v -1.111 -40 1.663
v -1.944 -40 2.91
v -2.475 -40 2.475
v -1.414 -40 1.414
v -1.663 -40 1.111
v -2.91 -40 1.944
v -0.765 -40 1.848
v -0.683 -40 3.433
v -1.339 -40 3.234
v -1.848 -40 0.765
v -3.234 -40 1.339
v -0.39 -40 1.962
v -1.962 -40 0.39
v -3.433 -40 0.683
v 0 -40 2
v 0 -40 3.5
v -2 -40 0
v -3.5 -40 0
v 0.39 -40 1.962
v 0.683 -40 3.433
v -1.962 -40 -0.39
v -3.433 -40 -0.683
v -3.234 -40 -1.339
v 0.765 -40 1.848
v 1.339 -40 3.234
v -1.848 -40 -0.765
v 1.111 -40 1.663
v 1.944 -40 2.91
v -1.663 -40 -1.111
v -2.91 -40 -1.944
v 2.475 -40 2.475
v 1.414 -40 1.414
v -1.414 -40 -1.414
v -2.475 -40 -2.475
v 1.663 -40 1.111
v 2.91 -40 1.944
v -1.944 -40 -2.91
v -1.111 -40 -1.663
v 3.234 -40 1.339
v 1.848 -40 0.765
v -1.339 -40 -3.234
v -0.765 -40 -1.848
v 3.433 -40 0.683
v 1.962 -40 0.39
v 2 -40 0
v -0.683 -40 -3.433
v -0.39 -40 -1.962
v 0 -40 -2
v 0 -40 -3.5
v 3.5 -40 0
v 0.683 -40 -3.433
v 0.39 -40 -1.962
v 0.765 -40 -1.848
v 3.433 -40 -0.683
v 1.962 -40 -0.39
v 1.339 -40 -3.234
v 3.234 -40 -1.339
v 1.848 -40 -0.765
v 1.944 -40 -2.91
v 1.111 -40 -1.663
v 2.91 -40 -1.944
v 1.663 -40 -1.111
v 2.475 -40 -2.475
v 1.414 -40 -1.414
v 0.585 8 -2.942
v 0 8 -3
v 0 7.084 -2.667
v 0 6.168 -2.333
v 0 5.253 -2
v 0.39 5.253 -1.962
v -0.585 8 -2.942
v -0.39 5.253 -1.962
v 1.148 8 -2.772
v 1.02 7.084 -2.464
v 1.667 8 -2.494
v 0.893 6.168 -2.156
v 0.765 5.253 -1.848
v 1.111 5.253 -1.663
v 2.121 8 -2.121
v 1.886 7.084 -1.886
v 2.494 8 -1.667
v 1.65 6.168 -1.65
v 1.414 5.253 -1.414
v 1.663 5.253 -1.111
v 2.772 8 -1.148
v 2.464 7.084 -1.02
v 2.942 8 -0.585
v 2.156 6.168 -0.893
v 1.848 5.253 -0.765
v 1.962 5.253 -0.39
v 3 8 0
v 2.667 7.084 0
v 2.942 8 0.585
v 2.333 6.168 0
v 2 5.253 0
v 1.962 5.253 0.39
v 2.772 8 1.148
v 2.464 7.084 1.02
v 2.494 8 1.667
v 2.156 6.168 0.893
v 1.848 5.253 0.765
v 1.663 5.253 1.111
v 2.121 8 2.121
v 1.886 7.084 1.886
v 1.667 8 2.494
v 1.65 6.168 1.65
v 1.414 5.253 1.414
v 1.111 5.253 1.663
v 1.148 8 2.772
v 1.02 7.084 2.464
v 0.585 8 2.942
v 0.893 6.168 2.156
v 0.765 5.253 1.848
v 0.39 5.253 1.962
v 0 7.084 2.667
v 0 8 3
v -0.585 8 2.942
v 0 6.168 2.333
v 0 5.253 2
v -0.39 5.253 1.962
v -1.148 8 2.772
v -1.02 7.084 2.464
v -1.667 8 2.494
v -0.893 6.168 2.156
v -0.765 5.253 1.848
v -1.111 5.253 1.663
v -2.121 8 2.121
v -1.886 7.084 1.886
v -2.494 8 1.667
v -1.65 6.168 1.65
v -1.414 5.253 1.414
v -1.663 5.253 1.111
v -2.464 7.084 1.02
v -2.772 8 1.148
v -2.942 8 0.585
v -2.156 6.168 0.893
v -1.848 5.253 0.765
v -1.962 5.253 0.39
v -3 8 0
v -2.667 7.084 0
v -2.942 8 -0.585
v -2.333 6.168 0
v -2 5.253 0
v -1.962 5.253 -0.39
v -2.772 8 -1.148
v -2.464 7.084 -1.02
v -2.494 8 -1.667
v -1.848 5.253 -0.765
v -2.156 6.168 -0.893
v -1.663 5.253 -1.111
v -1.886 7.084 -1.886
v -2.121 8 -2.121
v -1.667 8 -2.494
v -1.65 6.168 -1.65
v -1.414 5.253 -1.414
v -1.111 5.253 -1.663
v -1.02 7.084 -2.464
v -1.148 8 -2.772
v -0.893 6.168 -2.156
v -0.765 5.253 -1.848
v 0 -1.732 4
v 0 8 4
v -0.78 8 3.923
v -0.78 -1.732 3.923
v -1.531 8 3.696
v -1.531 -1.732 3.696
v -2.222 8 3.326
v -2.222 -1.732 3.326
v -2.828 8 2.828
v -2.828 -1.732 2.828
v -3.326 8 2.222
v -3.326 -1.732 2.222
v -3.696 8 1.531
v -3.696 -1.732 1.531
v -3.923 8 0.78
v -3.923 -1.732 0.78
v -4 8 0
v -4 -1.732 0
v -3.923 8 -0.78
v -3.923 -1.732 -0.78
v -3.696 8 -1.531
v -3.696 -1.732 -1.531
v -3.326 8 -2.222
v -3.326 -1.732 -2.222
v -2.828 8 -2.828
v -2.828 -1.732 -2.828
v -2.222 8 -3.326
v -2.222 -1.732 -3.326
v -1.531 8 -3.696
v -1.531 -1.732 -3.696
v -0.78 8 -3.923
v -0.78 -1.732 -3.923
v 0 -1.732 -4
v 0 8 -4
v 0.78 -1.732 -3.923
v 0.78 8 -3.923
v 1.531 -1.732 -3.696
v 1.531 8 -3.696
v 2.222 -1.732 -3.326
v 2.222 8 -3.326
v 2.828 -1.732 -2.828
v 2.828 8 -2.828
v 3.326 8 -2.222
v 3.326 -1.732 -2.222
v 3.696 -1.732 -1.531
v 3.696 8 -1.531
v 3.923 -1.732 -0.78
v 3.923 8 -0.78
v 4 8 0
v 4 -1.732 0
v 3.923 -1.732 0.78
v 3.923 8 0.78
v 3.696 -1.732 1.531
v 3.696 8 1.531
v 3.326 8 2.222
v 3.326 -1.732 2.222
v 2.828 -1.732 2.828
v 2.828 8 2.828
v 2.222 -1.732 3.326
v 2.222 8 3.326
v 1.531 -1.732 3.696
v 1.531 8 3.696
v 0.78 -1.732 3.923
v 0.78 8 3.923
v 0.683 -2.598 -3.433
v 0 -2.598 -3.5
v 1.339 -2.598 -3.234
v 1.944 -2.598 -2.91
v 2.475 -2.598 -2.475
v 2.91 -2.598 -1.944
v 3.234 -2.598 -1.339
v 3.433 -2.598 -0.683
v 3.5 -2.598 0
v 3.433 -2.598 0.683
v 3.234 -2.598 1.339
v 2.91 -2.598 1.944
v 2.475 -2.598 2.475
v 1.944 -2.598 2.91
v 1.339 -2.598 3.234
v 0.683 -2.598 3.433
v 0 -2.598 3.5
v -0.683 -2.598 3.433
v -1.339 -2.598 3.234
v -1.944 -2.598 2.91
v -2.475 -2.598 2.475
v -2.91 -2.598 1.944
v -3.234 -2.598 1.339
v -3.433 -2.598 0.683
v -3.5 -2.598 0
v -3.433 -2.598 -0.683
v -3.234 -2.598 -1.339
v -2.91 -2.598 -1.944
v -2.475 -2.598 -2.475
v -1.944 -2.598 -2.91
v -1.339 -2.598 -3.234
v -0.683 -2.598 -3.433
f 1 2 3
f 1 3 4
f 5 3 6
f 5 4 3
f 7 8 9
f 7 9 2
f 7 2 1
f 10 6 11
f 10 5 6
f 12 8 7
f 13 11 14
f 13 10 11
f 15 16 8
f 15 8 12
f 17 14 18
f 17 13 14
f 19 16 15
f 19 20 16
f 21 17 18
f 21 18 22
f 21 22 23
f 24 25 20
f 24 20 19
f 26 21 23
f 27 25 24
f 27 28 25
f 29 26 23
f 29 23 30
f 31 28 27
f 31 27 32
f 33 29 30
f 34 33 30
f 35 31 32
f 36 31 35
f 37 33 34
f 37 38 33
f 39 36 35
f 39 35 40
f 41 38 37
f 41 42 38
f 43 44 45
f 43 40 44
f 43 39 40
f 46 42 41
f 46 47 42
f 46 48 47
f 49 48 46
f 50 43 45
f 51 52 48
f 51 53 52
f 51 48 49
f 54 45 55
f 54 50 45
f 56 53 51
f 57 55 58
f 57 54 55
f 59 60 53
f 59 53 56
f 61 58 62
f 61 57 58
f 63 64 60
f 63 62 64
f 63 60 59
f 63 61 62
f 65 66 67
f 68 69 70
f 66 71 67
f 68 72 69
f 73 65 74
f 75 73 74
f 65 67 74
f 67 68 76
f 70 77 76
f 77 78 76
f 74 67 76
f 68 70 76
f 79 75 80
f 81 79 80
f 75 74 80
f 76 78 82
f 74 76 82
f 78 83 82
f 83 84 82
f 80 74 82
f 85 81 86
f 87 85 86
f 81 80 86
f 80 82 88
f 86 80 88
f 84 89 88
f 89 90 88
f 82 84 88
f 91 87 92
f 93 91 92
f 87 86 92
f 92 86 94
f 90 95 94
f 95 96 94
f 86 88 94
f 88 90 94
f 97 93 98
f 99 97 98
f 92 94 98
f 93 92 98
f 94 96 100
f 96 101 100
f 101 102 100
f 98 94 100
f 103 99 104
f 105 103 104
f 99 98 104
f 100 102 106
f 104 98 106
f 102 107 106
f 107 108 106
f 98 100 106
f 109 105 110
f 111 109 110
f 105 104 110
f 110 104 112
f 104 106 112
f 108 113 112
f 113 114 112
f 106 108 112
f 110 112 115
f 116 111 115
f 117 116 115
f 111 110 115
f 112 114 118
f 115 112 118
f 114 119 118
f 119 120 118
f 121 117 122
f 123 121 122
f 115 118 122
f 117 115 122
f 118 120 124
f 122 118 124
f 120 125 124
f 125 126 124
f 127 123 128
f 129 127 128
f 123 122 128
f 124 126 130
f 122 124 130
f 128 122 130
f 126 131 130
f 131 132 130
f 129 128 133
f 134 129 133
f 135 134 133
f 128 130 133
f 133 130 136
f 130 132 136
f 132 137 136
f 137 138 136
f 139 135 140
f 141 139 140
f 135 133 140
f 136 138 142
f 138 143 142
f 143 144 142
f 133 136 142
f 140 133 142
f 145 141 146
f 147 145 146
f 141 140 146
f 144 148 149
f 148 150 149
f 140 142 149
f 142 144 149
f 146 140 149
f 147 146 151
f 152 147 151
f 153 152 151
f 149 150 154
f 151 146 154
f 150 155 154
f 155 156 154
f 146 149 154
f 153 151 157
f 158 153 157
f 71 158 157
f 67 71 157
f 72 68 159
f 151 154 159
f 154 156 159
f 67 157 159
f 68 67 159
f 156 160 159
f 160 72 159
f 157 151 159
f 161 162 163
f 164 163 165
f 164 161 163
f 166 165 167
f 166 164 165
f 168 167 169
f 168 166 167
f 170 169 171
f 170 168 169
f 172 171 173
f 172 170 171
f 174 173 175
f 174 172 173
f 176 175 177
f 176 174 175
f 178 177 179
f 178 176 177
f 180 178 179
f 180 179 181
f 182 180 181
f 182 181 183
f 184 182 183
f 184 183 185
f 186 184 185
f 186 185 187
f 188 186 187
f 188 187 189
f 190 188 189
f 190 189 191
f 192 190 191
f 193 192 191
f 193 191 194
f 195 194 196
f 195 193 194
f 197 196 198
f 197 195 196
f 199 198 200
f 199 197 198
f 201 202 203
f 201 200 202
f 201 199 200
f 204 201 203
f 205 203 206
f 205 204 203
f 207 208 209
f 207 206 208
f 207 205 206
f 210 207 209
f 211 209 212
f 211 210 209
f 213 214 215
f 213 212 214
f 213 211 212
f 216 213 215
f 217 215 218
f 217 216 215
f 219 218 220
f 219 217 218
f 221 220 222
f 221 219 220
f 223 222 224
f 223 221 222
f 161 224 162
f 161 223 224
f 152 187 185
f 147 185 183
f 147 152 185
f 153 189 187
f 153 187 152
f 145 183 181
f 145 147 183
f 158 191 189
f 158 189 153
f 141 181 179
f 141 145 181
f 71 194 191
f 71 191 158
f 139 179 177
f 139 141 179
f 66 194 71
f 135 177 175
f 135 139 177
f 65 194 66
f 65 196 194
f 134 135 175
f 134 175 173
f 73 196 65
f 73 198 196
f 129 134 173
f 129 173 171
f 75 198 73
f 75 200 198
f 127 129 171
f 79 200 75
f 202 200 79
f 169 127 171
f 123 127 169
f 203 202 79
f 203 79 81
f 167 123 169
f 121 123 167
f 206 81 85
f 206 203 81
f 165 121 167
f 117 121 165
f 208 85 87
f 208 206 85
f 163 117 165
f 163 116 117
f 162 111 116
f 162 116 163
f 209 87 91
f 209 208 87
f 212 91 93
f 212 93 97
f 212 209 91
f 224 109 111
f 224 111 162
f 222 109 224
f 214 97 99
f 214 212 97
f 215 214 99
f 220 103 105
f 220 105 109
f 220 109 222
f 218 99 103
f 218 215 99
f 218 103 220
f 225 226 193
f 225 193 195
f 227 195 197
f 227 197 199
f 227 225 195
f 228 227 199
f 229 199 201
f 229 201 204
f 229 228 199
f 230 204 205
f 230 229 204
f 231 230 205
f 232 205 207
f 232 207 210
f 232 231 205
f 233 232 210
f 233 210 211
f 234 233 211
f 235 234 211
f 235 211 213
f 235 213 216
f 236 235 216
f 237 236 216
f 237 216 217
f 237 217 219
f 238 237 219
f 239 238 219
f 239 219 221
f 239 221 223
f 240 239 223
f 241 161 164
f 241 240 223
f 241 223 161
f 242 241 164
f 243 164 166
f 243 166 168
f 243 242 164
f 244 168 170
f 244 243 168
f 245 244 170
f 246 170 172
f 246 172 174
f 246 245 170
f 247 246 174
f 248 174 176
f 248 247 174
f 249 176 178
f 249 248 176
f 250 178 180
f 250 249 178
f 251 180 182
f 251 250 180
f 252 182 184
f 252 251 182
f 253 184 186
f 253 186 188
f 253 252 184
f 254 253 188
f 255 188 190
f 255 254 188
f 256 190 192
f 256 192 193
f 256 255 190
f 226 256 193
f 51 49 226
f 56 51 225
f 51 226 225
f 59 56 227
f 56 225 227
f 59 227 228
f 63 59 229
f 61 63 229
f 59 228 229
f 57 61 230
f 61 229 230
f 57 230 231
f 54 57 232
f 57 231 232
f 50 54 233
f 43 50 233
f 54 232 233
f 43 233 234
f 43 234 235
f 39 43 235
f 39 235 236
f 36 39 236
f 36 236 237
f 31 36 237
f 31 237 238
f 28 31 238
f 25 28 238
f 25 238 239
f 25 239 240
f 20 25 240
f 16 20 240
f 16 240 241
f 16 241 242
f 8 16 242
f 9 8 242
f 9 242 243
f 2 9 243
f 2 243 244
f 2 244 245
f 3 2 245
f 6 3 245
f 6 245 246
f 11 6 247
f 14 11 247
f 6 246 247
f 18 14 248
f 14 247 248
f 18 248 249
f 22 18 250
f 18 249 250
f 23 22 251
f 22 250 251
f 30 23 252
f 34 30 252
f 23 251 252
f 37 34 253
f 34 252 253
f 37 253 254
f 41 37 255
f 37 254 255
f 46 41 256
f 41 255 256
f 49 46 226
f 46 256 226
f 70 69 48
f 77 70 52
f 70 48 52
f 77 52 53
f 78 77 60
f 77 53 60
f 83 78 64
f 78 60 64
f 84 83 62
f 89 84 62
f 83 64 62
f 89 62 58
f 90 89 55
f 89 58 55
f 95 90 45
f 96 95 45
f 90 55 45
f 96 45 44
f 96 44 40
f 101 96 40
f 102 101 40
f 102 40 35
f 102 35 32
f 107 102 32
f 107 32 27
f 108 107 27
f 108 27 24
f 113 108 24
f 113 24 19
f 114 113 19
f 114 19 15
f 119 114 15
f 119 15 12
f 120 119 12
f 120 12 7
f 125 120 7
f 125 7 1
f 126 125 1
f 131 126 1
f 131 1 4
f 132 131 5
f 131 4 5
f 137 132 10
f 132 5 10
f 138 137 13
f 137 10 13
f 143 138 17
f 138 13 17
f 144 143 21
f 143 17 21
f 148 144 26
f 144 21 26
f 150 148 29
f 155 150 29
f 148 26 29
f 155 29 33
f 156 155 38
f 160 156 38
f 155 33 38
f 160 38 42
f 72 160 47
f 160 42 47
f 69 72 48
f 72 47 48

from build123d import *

# Parameters (mm, degrees)
SKETCH_1_R          = 4
EXTRUDE_1_DEPTH     = 8
SKETCH_2_R          = 3.5
EXTRUDE_2_DEPTH     = 40
CHAMFER_1_SIZE      = 1.5
CHAMFER_1_SIZE_2    = 2.598076211
SKETCH_3_R          = 2
CUT_EXTRUDE_1_DEPTH = 101
CHAMFER_2_SIZE      = 1
CHAMFER_2_SIZE2     = 2.747477419


with BuildPart() as part:
    # 草图1 → 凸台-拉伸1 (new body)
    with BuildSketch(Plane(origin=(0, 0, 0), x_dir=(1, 0, 0), z_dir=(0, 1, 0))):
        with Locations(Location((0, 0, 0), (0, 0, 270))):
            Circle(SKETCH_1_R)
    extrude(amount=EXTRUDE_1_DEPTH)

    # 草图2 → 凸台-拉伸2 (add)
    with BuildSketch(Plane.XZ):
        with Locations(Location((0, 0, 0), (0, 0, 270))):
            Circle(SKETCH_2_R)
    extrude(amount=EXTRUDE_2_DEPTH)

    # 倒角1
    # the kernel refuses this chamfer: 2.598076211, 1.5 mm, written as the material it adds along each edge
    with BuildSketch(Plane(origin=(0, 0, 0), x_dir=(0, 0, -1), z_dir=(-1, 0, 0))) as chamfer_1_piece_1_section:
        Polygon((3.5 + CHAMFER_1_SIZE, 0), (3.5, CHAMFER_1_SIZE_2), (3.5, 0), align=None)
    chamfer_1_piece_1 = revolve(axis=Axis((0, 0, 0), (0, -1, 0)), mode=Mode.PRIVATE)
    chamfer_1_piece_1 = chamfer_1_piece_1 & Plane(origin=(0, -2.194625368, 0), x_dir=(0, 0, 1), z_dir=(0, -1, 0)) * Cylinder(4, 20, mode=Mode.PRIVATE)
    add(chamfer_1_piece_1)

    # 草图3 → 切除-拉伸1 (cut)
    with BuildSketch(Plane.XZ.offset(40)):
        with Locations(Location((0, 0, 0), (0, 0, 270))):
            Circle(SKETCH_3_R)
    extrude(amount=-CUT_EXTRUDE_1_DEPTH, mode=Mode.SUBTRACT)

    # 倒角2
    chamfer_2_edges = [part.edges().sort_by_distance(p)[0] for p in [
        (0, 8, 2),
    ]]
    chamfer_2_side = [part.faces().sort_by_distance(p)[0] for p in [
        (0, 8, -3.886862915),
    ]]
    chamfer(chamfer_2_edges, length=CHAMFER_2_SIZE, length2=CHAMFER_2_SIZE2, reference=chamfer_2_side[0])


solid = part.part
